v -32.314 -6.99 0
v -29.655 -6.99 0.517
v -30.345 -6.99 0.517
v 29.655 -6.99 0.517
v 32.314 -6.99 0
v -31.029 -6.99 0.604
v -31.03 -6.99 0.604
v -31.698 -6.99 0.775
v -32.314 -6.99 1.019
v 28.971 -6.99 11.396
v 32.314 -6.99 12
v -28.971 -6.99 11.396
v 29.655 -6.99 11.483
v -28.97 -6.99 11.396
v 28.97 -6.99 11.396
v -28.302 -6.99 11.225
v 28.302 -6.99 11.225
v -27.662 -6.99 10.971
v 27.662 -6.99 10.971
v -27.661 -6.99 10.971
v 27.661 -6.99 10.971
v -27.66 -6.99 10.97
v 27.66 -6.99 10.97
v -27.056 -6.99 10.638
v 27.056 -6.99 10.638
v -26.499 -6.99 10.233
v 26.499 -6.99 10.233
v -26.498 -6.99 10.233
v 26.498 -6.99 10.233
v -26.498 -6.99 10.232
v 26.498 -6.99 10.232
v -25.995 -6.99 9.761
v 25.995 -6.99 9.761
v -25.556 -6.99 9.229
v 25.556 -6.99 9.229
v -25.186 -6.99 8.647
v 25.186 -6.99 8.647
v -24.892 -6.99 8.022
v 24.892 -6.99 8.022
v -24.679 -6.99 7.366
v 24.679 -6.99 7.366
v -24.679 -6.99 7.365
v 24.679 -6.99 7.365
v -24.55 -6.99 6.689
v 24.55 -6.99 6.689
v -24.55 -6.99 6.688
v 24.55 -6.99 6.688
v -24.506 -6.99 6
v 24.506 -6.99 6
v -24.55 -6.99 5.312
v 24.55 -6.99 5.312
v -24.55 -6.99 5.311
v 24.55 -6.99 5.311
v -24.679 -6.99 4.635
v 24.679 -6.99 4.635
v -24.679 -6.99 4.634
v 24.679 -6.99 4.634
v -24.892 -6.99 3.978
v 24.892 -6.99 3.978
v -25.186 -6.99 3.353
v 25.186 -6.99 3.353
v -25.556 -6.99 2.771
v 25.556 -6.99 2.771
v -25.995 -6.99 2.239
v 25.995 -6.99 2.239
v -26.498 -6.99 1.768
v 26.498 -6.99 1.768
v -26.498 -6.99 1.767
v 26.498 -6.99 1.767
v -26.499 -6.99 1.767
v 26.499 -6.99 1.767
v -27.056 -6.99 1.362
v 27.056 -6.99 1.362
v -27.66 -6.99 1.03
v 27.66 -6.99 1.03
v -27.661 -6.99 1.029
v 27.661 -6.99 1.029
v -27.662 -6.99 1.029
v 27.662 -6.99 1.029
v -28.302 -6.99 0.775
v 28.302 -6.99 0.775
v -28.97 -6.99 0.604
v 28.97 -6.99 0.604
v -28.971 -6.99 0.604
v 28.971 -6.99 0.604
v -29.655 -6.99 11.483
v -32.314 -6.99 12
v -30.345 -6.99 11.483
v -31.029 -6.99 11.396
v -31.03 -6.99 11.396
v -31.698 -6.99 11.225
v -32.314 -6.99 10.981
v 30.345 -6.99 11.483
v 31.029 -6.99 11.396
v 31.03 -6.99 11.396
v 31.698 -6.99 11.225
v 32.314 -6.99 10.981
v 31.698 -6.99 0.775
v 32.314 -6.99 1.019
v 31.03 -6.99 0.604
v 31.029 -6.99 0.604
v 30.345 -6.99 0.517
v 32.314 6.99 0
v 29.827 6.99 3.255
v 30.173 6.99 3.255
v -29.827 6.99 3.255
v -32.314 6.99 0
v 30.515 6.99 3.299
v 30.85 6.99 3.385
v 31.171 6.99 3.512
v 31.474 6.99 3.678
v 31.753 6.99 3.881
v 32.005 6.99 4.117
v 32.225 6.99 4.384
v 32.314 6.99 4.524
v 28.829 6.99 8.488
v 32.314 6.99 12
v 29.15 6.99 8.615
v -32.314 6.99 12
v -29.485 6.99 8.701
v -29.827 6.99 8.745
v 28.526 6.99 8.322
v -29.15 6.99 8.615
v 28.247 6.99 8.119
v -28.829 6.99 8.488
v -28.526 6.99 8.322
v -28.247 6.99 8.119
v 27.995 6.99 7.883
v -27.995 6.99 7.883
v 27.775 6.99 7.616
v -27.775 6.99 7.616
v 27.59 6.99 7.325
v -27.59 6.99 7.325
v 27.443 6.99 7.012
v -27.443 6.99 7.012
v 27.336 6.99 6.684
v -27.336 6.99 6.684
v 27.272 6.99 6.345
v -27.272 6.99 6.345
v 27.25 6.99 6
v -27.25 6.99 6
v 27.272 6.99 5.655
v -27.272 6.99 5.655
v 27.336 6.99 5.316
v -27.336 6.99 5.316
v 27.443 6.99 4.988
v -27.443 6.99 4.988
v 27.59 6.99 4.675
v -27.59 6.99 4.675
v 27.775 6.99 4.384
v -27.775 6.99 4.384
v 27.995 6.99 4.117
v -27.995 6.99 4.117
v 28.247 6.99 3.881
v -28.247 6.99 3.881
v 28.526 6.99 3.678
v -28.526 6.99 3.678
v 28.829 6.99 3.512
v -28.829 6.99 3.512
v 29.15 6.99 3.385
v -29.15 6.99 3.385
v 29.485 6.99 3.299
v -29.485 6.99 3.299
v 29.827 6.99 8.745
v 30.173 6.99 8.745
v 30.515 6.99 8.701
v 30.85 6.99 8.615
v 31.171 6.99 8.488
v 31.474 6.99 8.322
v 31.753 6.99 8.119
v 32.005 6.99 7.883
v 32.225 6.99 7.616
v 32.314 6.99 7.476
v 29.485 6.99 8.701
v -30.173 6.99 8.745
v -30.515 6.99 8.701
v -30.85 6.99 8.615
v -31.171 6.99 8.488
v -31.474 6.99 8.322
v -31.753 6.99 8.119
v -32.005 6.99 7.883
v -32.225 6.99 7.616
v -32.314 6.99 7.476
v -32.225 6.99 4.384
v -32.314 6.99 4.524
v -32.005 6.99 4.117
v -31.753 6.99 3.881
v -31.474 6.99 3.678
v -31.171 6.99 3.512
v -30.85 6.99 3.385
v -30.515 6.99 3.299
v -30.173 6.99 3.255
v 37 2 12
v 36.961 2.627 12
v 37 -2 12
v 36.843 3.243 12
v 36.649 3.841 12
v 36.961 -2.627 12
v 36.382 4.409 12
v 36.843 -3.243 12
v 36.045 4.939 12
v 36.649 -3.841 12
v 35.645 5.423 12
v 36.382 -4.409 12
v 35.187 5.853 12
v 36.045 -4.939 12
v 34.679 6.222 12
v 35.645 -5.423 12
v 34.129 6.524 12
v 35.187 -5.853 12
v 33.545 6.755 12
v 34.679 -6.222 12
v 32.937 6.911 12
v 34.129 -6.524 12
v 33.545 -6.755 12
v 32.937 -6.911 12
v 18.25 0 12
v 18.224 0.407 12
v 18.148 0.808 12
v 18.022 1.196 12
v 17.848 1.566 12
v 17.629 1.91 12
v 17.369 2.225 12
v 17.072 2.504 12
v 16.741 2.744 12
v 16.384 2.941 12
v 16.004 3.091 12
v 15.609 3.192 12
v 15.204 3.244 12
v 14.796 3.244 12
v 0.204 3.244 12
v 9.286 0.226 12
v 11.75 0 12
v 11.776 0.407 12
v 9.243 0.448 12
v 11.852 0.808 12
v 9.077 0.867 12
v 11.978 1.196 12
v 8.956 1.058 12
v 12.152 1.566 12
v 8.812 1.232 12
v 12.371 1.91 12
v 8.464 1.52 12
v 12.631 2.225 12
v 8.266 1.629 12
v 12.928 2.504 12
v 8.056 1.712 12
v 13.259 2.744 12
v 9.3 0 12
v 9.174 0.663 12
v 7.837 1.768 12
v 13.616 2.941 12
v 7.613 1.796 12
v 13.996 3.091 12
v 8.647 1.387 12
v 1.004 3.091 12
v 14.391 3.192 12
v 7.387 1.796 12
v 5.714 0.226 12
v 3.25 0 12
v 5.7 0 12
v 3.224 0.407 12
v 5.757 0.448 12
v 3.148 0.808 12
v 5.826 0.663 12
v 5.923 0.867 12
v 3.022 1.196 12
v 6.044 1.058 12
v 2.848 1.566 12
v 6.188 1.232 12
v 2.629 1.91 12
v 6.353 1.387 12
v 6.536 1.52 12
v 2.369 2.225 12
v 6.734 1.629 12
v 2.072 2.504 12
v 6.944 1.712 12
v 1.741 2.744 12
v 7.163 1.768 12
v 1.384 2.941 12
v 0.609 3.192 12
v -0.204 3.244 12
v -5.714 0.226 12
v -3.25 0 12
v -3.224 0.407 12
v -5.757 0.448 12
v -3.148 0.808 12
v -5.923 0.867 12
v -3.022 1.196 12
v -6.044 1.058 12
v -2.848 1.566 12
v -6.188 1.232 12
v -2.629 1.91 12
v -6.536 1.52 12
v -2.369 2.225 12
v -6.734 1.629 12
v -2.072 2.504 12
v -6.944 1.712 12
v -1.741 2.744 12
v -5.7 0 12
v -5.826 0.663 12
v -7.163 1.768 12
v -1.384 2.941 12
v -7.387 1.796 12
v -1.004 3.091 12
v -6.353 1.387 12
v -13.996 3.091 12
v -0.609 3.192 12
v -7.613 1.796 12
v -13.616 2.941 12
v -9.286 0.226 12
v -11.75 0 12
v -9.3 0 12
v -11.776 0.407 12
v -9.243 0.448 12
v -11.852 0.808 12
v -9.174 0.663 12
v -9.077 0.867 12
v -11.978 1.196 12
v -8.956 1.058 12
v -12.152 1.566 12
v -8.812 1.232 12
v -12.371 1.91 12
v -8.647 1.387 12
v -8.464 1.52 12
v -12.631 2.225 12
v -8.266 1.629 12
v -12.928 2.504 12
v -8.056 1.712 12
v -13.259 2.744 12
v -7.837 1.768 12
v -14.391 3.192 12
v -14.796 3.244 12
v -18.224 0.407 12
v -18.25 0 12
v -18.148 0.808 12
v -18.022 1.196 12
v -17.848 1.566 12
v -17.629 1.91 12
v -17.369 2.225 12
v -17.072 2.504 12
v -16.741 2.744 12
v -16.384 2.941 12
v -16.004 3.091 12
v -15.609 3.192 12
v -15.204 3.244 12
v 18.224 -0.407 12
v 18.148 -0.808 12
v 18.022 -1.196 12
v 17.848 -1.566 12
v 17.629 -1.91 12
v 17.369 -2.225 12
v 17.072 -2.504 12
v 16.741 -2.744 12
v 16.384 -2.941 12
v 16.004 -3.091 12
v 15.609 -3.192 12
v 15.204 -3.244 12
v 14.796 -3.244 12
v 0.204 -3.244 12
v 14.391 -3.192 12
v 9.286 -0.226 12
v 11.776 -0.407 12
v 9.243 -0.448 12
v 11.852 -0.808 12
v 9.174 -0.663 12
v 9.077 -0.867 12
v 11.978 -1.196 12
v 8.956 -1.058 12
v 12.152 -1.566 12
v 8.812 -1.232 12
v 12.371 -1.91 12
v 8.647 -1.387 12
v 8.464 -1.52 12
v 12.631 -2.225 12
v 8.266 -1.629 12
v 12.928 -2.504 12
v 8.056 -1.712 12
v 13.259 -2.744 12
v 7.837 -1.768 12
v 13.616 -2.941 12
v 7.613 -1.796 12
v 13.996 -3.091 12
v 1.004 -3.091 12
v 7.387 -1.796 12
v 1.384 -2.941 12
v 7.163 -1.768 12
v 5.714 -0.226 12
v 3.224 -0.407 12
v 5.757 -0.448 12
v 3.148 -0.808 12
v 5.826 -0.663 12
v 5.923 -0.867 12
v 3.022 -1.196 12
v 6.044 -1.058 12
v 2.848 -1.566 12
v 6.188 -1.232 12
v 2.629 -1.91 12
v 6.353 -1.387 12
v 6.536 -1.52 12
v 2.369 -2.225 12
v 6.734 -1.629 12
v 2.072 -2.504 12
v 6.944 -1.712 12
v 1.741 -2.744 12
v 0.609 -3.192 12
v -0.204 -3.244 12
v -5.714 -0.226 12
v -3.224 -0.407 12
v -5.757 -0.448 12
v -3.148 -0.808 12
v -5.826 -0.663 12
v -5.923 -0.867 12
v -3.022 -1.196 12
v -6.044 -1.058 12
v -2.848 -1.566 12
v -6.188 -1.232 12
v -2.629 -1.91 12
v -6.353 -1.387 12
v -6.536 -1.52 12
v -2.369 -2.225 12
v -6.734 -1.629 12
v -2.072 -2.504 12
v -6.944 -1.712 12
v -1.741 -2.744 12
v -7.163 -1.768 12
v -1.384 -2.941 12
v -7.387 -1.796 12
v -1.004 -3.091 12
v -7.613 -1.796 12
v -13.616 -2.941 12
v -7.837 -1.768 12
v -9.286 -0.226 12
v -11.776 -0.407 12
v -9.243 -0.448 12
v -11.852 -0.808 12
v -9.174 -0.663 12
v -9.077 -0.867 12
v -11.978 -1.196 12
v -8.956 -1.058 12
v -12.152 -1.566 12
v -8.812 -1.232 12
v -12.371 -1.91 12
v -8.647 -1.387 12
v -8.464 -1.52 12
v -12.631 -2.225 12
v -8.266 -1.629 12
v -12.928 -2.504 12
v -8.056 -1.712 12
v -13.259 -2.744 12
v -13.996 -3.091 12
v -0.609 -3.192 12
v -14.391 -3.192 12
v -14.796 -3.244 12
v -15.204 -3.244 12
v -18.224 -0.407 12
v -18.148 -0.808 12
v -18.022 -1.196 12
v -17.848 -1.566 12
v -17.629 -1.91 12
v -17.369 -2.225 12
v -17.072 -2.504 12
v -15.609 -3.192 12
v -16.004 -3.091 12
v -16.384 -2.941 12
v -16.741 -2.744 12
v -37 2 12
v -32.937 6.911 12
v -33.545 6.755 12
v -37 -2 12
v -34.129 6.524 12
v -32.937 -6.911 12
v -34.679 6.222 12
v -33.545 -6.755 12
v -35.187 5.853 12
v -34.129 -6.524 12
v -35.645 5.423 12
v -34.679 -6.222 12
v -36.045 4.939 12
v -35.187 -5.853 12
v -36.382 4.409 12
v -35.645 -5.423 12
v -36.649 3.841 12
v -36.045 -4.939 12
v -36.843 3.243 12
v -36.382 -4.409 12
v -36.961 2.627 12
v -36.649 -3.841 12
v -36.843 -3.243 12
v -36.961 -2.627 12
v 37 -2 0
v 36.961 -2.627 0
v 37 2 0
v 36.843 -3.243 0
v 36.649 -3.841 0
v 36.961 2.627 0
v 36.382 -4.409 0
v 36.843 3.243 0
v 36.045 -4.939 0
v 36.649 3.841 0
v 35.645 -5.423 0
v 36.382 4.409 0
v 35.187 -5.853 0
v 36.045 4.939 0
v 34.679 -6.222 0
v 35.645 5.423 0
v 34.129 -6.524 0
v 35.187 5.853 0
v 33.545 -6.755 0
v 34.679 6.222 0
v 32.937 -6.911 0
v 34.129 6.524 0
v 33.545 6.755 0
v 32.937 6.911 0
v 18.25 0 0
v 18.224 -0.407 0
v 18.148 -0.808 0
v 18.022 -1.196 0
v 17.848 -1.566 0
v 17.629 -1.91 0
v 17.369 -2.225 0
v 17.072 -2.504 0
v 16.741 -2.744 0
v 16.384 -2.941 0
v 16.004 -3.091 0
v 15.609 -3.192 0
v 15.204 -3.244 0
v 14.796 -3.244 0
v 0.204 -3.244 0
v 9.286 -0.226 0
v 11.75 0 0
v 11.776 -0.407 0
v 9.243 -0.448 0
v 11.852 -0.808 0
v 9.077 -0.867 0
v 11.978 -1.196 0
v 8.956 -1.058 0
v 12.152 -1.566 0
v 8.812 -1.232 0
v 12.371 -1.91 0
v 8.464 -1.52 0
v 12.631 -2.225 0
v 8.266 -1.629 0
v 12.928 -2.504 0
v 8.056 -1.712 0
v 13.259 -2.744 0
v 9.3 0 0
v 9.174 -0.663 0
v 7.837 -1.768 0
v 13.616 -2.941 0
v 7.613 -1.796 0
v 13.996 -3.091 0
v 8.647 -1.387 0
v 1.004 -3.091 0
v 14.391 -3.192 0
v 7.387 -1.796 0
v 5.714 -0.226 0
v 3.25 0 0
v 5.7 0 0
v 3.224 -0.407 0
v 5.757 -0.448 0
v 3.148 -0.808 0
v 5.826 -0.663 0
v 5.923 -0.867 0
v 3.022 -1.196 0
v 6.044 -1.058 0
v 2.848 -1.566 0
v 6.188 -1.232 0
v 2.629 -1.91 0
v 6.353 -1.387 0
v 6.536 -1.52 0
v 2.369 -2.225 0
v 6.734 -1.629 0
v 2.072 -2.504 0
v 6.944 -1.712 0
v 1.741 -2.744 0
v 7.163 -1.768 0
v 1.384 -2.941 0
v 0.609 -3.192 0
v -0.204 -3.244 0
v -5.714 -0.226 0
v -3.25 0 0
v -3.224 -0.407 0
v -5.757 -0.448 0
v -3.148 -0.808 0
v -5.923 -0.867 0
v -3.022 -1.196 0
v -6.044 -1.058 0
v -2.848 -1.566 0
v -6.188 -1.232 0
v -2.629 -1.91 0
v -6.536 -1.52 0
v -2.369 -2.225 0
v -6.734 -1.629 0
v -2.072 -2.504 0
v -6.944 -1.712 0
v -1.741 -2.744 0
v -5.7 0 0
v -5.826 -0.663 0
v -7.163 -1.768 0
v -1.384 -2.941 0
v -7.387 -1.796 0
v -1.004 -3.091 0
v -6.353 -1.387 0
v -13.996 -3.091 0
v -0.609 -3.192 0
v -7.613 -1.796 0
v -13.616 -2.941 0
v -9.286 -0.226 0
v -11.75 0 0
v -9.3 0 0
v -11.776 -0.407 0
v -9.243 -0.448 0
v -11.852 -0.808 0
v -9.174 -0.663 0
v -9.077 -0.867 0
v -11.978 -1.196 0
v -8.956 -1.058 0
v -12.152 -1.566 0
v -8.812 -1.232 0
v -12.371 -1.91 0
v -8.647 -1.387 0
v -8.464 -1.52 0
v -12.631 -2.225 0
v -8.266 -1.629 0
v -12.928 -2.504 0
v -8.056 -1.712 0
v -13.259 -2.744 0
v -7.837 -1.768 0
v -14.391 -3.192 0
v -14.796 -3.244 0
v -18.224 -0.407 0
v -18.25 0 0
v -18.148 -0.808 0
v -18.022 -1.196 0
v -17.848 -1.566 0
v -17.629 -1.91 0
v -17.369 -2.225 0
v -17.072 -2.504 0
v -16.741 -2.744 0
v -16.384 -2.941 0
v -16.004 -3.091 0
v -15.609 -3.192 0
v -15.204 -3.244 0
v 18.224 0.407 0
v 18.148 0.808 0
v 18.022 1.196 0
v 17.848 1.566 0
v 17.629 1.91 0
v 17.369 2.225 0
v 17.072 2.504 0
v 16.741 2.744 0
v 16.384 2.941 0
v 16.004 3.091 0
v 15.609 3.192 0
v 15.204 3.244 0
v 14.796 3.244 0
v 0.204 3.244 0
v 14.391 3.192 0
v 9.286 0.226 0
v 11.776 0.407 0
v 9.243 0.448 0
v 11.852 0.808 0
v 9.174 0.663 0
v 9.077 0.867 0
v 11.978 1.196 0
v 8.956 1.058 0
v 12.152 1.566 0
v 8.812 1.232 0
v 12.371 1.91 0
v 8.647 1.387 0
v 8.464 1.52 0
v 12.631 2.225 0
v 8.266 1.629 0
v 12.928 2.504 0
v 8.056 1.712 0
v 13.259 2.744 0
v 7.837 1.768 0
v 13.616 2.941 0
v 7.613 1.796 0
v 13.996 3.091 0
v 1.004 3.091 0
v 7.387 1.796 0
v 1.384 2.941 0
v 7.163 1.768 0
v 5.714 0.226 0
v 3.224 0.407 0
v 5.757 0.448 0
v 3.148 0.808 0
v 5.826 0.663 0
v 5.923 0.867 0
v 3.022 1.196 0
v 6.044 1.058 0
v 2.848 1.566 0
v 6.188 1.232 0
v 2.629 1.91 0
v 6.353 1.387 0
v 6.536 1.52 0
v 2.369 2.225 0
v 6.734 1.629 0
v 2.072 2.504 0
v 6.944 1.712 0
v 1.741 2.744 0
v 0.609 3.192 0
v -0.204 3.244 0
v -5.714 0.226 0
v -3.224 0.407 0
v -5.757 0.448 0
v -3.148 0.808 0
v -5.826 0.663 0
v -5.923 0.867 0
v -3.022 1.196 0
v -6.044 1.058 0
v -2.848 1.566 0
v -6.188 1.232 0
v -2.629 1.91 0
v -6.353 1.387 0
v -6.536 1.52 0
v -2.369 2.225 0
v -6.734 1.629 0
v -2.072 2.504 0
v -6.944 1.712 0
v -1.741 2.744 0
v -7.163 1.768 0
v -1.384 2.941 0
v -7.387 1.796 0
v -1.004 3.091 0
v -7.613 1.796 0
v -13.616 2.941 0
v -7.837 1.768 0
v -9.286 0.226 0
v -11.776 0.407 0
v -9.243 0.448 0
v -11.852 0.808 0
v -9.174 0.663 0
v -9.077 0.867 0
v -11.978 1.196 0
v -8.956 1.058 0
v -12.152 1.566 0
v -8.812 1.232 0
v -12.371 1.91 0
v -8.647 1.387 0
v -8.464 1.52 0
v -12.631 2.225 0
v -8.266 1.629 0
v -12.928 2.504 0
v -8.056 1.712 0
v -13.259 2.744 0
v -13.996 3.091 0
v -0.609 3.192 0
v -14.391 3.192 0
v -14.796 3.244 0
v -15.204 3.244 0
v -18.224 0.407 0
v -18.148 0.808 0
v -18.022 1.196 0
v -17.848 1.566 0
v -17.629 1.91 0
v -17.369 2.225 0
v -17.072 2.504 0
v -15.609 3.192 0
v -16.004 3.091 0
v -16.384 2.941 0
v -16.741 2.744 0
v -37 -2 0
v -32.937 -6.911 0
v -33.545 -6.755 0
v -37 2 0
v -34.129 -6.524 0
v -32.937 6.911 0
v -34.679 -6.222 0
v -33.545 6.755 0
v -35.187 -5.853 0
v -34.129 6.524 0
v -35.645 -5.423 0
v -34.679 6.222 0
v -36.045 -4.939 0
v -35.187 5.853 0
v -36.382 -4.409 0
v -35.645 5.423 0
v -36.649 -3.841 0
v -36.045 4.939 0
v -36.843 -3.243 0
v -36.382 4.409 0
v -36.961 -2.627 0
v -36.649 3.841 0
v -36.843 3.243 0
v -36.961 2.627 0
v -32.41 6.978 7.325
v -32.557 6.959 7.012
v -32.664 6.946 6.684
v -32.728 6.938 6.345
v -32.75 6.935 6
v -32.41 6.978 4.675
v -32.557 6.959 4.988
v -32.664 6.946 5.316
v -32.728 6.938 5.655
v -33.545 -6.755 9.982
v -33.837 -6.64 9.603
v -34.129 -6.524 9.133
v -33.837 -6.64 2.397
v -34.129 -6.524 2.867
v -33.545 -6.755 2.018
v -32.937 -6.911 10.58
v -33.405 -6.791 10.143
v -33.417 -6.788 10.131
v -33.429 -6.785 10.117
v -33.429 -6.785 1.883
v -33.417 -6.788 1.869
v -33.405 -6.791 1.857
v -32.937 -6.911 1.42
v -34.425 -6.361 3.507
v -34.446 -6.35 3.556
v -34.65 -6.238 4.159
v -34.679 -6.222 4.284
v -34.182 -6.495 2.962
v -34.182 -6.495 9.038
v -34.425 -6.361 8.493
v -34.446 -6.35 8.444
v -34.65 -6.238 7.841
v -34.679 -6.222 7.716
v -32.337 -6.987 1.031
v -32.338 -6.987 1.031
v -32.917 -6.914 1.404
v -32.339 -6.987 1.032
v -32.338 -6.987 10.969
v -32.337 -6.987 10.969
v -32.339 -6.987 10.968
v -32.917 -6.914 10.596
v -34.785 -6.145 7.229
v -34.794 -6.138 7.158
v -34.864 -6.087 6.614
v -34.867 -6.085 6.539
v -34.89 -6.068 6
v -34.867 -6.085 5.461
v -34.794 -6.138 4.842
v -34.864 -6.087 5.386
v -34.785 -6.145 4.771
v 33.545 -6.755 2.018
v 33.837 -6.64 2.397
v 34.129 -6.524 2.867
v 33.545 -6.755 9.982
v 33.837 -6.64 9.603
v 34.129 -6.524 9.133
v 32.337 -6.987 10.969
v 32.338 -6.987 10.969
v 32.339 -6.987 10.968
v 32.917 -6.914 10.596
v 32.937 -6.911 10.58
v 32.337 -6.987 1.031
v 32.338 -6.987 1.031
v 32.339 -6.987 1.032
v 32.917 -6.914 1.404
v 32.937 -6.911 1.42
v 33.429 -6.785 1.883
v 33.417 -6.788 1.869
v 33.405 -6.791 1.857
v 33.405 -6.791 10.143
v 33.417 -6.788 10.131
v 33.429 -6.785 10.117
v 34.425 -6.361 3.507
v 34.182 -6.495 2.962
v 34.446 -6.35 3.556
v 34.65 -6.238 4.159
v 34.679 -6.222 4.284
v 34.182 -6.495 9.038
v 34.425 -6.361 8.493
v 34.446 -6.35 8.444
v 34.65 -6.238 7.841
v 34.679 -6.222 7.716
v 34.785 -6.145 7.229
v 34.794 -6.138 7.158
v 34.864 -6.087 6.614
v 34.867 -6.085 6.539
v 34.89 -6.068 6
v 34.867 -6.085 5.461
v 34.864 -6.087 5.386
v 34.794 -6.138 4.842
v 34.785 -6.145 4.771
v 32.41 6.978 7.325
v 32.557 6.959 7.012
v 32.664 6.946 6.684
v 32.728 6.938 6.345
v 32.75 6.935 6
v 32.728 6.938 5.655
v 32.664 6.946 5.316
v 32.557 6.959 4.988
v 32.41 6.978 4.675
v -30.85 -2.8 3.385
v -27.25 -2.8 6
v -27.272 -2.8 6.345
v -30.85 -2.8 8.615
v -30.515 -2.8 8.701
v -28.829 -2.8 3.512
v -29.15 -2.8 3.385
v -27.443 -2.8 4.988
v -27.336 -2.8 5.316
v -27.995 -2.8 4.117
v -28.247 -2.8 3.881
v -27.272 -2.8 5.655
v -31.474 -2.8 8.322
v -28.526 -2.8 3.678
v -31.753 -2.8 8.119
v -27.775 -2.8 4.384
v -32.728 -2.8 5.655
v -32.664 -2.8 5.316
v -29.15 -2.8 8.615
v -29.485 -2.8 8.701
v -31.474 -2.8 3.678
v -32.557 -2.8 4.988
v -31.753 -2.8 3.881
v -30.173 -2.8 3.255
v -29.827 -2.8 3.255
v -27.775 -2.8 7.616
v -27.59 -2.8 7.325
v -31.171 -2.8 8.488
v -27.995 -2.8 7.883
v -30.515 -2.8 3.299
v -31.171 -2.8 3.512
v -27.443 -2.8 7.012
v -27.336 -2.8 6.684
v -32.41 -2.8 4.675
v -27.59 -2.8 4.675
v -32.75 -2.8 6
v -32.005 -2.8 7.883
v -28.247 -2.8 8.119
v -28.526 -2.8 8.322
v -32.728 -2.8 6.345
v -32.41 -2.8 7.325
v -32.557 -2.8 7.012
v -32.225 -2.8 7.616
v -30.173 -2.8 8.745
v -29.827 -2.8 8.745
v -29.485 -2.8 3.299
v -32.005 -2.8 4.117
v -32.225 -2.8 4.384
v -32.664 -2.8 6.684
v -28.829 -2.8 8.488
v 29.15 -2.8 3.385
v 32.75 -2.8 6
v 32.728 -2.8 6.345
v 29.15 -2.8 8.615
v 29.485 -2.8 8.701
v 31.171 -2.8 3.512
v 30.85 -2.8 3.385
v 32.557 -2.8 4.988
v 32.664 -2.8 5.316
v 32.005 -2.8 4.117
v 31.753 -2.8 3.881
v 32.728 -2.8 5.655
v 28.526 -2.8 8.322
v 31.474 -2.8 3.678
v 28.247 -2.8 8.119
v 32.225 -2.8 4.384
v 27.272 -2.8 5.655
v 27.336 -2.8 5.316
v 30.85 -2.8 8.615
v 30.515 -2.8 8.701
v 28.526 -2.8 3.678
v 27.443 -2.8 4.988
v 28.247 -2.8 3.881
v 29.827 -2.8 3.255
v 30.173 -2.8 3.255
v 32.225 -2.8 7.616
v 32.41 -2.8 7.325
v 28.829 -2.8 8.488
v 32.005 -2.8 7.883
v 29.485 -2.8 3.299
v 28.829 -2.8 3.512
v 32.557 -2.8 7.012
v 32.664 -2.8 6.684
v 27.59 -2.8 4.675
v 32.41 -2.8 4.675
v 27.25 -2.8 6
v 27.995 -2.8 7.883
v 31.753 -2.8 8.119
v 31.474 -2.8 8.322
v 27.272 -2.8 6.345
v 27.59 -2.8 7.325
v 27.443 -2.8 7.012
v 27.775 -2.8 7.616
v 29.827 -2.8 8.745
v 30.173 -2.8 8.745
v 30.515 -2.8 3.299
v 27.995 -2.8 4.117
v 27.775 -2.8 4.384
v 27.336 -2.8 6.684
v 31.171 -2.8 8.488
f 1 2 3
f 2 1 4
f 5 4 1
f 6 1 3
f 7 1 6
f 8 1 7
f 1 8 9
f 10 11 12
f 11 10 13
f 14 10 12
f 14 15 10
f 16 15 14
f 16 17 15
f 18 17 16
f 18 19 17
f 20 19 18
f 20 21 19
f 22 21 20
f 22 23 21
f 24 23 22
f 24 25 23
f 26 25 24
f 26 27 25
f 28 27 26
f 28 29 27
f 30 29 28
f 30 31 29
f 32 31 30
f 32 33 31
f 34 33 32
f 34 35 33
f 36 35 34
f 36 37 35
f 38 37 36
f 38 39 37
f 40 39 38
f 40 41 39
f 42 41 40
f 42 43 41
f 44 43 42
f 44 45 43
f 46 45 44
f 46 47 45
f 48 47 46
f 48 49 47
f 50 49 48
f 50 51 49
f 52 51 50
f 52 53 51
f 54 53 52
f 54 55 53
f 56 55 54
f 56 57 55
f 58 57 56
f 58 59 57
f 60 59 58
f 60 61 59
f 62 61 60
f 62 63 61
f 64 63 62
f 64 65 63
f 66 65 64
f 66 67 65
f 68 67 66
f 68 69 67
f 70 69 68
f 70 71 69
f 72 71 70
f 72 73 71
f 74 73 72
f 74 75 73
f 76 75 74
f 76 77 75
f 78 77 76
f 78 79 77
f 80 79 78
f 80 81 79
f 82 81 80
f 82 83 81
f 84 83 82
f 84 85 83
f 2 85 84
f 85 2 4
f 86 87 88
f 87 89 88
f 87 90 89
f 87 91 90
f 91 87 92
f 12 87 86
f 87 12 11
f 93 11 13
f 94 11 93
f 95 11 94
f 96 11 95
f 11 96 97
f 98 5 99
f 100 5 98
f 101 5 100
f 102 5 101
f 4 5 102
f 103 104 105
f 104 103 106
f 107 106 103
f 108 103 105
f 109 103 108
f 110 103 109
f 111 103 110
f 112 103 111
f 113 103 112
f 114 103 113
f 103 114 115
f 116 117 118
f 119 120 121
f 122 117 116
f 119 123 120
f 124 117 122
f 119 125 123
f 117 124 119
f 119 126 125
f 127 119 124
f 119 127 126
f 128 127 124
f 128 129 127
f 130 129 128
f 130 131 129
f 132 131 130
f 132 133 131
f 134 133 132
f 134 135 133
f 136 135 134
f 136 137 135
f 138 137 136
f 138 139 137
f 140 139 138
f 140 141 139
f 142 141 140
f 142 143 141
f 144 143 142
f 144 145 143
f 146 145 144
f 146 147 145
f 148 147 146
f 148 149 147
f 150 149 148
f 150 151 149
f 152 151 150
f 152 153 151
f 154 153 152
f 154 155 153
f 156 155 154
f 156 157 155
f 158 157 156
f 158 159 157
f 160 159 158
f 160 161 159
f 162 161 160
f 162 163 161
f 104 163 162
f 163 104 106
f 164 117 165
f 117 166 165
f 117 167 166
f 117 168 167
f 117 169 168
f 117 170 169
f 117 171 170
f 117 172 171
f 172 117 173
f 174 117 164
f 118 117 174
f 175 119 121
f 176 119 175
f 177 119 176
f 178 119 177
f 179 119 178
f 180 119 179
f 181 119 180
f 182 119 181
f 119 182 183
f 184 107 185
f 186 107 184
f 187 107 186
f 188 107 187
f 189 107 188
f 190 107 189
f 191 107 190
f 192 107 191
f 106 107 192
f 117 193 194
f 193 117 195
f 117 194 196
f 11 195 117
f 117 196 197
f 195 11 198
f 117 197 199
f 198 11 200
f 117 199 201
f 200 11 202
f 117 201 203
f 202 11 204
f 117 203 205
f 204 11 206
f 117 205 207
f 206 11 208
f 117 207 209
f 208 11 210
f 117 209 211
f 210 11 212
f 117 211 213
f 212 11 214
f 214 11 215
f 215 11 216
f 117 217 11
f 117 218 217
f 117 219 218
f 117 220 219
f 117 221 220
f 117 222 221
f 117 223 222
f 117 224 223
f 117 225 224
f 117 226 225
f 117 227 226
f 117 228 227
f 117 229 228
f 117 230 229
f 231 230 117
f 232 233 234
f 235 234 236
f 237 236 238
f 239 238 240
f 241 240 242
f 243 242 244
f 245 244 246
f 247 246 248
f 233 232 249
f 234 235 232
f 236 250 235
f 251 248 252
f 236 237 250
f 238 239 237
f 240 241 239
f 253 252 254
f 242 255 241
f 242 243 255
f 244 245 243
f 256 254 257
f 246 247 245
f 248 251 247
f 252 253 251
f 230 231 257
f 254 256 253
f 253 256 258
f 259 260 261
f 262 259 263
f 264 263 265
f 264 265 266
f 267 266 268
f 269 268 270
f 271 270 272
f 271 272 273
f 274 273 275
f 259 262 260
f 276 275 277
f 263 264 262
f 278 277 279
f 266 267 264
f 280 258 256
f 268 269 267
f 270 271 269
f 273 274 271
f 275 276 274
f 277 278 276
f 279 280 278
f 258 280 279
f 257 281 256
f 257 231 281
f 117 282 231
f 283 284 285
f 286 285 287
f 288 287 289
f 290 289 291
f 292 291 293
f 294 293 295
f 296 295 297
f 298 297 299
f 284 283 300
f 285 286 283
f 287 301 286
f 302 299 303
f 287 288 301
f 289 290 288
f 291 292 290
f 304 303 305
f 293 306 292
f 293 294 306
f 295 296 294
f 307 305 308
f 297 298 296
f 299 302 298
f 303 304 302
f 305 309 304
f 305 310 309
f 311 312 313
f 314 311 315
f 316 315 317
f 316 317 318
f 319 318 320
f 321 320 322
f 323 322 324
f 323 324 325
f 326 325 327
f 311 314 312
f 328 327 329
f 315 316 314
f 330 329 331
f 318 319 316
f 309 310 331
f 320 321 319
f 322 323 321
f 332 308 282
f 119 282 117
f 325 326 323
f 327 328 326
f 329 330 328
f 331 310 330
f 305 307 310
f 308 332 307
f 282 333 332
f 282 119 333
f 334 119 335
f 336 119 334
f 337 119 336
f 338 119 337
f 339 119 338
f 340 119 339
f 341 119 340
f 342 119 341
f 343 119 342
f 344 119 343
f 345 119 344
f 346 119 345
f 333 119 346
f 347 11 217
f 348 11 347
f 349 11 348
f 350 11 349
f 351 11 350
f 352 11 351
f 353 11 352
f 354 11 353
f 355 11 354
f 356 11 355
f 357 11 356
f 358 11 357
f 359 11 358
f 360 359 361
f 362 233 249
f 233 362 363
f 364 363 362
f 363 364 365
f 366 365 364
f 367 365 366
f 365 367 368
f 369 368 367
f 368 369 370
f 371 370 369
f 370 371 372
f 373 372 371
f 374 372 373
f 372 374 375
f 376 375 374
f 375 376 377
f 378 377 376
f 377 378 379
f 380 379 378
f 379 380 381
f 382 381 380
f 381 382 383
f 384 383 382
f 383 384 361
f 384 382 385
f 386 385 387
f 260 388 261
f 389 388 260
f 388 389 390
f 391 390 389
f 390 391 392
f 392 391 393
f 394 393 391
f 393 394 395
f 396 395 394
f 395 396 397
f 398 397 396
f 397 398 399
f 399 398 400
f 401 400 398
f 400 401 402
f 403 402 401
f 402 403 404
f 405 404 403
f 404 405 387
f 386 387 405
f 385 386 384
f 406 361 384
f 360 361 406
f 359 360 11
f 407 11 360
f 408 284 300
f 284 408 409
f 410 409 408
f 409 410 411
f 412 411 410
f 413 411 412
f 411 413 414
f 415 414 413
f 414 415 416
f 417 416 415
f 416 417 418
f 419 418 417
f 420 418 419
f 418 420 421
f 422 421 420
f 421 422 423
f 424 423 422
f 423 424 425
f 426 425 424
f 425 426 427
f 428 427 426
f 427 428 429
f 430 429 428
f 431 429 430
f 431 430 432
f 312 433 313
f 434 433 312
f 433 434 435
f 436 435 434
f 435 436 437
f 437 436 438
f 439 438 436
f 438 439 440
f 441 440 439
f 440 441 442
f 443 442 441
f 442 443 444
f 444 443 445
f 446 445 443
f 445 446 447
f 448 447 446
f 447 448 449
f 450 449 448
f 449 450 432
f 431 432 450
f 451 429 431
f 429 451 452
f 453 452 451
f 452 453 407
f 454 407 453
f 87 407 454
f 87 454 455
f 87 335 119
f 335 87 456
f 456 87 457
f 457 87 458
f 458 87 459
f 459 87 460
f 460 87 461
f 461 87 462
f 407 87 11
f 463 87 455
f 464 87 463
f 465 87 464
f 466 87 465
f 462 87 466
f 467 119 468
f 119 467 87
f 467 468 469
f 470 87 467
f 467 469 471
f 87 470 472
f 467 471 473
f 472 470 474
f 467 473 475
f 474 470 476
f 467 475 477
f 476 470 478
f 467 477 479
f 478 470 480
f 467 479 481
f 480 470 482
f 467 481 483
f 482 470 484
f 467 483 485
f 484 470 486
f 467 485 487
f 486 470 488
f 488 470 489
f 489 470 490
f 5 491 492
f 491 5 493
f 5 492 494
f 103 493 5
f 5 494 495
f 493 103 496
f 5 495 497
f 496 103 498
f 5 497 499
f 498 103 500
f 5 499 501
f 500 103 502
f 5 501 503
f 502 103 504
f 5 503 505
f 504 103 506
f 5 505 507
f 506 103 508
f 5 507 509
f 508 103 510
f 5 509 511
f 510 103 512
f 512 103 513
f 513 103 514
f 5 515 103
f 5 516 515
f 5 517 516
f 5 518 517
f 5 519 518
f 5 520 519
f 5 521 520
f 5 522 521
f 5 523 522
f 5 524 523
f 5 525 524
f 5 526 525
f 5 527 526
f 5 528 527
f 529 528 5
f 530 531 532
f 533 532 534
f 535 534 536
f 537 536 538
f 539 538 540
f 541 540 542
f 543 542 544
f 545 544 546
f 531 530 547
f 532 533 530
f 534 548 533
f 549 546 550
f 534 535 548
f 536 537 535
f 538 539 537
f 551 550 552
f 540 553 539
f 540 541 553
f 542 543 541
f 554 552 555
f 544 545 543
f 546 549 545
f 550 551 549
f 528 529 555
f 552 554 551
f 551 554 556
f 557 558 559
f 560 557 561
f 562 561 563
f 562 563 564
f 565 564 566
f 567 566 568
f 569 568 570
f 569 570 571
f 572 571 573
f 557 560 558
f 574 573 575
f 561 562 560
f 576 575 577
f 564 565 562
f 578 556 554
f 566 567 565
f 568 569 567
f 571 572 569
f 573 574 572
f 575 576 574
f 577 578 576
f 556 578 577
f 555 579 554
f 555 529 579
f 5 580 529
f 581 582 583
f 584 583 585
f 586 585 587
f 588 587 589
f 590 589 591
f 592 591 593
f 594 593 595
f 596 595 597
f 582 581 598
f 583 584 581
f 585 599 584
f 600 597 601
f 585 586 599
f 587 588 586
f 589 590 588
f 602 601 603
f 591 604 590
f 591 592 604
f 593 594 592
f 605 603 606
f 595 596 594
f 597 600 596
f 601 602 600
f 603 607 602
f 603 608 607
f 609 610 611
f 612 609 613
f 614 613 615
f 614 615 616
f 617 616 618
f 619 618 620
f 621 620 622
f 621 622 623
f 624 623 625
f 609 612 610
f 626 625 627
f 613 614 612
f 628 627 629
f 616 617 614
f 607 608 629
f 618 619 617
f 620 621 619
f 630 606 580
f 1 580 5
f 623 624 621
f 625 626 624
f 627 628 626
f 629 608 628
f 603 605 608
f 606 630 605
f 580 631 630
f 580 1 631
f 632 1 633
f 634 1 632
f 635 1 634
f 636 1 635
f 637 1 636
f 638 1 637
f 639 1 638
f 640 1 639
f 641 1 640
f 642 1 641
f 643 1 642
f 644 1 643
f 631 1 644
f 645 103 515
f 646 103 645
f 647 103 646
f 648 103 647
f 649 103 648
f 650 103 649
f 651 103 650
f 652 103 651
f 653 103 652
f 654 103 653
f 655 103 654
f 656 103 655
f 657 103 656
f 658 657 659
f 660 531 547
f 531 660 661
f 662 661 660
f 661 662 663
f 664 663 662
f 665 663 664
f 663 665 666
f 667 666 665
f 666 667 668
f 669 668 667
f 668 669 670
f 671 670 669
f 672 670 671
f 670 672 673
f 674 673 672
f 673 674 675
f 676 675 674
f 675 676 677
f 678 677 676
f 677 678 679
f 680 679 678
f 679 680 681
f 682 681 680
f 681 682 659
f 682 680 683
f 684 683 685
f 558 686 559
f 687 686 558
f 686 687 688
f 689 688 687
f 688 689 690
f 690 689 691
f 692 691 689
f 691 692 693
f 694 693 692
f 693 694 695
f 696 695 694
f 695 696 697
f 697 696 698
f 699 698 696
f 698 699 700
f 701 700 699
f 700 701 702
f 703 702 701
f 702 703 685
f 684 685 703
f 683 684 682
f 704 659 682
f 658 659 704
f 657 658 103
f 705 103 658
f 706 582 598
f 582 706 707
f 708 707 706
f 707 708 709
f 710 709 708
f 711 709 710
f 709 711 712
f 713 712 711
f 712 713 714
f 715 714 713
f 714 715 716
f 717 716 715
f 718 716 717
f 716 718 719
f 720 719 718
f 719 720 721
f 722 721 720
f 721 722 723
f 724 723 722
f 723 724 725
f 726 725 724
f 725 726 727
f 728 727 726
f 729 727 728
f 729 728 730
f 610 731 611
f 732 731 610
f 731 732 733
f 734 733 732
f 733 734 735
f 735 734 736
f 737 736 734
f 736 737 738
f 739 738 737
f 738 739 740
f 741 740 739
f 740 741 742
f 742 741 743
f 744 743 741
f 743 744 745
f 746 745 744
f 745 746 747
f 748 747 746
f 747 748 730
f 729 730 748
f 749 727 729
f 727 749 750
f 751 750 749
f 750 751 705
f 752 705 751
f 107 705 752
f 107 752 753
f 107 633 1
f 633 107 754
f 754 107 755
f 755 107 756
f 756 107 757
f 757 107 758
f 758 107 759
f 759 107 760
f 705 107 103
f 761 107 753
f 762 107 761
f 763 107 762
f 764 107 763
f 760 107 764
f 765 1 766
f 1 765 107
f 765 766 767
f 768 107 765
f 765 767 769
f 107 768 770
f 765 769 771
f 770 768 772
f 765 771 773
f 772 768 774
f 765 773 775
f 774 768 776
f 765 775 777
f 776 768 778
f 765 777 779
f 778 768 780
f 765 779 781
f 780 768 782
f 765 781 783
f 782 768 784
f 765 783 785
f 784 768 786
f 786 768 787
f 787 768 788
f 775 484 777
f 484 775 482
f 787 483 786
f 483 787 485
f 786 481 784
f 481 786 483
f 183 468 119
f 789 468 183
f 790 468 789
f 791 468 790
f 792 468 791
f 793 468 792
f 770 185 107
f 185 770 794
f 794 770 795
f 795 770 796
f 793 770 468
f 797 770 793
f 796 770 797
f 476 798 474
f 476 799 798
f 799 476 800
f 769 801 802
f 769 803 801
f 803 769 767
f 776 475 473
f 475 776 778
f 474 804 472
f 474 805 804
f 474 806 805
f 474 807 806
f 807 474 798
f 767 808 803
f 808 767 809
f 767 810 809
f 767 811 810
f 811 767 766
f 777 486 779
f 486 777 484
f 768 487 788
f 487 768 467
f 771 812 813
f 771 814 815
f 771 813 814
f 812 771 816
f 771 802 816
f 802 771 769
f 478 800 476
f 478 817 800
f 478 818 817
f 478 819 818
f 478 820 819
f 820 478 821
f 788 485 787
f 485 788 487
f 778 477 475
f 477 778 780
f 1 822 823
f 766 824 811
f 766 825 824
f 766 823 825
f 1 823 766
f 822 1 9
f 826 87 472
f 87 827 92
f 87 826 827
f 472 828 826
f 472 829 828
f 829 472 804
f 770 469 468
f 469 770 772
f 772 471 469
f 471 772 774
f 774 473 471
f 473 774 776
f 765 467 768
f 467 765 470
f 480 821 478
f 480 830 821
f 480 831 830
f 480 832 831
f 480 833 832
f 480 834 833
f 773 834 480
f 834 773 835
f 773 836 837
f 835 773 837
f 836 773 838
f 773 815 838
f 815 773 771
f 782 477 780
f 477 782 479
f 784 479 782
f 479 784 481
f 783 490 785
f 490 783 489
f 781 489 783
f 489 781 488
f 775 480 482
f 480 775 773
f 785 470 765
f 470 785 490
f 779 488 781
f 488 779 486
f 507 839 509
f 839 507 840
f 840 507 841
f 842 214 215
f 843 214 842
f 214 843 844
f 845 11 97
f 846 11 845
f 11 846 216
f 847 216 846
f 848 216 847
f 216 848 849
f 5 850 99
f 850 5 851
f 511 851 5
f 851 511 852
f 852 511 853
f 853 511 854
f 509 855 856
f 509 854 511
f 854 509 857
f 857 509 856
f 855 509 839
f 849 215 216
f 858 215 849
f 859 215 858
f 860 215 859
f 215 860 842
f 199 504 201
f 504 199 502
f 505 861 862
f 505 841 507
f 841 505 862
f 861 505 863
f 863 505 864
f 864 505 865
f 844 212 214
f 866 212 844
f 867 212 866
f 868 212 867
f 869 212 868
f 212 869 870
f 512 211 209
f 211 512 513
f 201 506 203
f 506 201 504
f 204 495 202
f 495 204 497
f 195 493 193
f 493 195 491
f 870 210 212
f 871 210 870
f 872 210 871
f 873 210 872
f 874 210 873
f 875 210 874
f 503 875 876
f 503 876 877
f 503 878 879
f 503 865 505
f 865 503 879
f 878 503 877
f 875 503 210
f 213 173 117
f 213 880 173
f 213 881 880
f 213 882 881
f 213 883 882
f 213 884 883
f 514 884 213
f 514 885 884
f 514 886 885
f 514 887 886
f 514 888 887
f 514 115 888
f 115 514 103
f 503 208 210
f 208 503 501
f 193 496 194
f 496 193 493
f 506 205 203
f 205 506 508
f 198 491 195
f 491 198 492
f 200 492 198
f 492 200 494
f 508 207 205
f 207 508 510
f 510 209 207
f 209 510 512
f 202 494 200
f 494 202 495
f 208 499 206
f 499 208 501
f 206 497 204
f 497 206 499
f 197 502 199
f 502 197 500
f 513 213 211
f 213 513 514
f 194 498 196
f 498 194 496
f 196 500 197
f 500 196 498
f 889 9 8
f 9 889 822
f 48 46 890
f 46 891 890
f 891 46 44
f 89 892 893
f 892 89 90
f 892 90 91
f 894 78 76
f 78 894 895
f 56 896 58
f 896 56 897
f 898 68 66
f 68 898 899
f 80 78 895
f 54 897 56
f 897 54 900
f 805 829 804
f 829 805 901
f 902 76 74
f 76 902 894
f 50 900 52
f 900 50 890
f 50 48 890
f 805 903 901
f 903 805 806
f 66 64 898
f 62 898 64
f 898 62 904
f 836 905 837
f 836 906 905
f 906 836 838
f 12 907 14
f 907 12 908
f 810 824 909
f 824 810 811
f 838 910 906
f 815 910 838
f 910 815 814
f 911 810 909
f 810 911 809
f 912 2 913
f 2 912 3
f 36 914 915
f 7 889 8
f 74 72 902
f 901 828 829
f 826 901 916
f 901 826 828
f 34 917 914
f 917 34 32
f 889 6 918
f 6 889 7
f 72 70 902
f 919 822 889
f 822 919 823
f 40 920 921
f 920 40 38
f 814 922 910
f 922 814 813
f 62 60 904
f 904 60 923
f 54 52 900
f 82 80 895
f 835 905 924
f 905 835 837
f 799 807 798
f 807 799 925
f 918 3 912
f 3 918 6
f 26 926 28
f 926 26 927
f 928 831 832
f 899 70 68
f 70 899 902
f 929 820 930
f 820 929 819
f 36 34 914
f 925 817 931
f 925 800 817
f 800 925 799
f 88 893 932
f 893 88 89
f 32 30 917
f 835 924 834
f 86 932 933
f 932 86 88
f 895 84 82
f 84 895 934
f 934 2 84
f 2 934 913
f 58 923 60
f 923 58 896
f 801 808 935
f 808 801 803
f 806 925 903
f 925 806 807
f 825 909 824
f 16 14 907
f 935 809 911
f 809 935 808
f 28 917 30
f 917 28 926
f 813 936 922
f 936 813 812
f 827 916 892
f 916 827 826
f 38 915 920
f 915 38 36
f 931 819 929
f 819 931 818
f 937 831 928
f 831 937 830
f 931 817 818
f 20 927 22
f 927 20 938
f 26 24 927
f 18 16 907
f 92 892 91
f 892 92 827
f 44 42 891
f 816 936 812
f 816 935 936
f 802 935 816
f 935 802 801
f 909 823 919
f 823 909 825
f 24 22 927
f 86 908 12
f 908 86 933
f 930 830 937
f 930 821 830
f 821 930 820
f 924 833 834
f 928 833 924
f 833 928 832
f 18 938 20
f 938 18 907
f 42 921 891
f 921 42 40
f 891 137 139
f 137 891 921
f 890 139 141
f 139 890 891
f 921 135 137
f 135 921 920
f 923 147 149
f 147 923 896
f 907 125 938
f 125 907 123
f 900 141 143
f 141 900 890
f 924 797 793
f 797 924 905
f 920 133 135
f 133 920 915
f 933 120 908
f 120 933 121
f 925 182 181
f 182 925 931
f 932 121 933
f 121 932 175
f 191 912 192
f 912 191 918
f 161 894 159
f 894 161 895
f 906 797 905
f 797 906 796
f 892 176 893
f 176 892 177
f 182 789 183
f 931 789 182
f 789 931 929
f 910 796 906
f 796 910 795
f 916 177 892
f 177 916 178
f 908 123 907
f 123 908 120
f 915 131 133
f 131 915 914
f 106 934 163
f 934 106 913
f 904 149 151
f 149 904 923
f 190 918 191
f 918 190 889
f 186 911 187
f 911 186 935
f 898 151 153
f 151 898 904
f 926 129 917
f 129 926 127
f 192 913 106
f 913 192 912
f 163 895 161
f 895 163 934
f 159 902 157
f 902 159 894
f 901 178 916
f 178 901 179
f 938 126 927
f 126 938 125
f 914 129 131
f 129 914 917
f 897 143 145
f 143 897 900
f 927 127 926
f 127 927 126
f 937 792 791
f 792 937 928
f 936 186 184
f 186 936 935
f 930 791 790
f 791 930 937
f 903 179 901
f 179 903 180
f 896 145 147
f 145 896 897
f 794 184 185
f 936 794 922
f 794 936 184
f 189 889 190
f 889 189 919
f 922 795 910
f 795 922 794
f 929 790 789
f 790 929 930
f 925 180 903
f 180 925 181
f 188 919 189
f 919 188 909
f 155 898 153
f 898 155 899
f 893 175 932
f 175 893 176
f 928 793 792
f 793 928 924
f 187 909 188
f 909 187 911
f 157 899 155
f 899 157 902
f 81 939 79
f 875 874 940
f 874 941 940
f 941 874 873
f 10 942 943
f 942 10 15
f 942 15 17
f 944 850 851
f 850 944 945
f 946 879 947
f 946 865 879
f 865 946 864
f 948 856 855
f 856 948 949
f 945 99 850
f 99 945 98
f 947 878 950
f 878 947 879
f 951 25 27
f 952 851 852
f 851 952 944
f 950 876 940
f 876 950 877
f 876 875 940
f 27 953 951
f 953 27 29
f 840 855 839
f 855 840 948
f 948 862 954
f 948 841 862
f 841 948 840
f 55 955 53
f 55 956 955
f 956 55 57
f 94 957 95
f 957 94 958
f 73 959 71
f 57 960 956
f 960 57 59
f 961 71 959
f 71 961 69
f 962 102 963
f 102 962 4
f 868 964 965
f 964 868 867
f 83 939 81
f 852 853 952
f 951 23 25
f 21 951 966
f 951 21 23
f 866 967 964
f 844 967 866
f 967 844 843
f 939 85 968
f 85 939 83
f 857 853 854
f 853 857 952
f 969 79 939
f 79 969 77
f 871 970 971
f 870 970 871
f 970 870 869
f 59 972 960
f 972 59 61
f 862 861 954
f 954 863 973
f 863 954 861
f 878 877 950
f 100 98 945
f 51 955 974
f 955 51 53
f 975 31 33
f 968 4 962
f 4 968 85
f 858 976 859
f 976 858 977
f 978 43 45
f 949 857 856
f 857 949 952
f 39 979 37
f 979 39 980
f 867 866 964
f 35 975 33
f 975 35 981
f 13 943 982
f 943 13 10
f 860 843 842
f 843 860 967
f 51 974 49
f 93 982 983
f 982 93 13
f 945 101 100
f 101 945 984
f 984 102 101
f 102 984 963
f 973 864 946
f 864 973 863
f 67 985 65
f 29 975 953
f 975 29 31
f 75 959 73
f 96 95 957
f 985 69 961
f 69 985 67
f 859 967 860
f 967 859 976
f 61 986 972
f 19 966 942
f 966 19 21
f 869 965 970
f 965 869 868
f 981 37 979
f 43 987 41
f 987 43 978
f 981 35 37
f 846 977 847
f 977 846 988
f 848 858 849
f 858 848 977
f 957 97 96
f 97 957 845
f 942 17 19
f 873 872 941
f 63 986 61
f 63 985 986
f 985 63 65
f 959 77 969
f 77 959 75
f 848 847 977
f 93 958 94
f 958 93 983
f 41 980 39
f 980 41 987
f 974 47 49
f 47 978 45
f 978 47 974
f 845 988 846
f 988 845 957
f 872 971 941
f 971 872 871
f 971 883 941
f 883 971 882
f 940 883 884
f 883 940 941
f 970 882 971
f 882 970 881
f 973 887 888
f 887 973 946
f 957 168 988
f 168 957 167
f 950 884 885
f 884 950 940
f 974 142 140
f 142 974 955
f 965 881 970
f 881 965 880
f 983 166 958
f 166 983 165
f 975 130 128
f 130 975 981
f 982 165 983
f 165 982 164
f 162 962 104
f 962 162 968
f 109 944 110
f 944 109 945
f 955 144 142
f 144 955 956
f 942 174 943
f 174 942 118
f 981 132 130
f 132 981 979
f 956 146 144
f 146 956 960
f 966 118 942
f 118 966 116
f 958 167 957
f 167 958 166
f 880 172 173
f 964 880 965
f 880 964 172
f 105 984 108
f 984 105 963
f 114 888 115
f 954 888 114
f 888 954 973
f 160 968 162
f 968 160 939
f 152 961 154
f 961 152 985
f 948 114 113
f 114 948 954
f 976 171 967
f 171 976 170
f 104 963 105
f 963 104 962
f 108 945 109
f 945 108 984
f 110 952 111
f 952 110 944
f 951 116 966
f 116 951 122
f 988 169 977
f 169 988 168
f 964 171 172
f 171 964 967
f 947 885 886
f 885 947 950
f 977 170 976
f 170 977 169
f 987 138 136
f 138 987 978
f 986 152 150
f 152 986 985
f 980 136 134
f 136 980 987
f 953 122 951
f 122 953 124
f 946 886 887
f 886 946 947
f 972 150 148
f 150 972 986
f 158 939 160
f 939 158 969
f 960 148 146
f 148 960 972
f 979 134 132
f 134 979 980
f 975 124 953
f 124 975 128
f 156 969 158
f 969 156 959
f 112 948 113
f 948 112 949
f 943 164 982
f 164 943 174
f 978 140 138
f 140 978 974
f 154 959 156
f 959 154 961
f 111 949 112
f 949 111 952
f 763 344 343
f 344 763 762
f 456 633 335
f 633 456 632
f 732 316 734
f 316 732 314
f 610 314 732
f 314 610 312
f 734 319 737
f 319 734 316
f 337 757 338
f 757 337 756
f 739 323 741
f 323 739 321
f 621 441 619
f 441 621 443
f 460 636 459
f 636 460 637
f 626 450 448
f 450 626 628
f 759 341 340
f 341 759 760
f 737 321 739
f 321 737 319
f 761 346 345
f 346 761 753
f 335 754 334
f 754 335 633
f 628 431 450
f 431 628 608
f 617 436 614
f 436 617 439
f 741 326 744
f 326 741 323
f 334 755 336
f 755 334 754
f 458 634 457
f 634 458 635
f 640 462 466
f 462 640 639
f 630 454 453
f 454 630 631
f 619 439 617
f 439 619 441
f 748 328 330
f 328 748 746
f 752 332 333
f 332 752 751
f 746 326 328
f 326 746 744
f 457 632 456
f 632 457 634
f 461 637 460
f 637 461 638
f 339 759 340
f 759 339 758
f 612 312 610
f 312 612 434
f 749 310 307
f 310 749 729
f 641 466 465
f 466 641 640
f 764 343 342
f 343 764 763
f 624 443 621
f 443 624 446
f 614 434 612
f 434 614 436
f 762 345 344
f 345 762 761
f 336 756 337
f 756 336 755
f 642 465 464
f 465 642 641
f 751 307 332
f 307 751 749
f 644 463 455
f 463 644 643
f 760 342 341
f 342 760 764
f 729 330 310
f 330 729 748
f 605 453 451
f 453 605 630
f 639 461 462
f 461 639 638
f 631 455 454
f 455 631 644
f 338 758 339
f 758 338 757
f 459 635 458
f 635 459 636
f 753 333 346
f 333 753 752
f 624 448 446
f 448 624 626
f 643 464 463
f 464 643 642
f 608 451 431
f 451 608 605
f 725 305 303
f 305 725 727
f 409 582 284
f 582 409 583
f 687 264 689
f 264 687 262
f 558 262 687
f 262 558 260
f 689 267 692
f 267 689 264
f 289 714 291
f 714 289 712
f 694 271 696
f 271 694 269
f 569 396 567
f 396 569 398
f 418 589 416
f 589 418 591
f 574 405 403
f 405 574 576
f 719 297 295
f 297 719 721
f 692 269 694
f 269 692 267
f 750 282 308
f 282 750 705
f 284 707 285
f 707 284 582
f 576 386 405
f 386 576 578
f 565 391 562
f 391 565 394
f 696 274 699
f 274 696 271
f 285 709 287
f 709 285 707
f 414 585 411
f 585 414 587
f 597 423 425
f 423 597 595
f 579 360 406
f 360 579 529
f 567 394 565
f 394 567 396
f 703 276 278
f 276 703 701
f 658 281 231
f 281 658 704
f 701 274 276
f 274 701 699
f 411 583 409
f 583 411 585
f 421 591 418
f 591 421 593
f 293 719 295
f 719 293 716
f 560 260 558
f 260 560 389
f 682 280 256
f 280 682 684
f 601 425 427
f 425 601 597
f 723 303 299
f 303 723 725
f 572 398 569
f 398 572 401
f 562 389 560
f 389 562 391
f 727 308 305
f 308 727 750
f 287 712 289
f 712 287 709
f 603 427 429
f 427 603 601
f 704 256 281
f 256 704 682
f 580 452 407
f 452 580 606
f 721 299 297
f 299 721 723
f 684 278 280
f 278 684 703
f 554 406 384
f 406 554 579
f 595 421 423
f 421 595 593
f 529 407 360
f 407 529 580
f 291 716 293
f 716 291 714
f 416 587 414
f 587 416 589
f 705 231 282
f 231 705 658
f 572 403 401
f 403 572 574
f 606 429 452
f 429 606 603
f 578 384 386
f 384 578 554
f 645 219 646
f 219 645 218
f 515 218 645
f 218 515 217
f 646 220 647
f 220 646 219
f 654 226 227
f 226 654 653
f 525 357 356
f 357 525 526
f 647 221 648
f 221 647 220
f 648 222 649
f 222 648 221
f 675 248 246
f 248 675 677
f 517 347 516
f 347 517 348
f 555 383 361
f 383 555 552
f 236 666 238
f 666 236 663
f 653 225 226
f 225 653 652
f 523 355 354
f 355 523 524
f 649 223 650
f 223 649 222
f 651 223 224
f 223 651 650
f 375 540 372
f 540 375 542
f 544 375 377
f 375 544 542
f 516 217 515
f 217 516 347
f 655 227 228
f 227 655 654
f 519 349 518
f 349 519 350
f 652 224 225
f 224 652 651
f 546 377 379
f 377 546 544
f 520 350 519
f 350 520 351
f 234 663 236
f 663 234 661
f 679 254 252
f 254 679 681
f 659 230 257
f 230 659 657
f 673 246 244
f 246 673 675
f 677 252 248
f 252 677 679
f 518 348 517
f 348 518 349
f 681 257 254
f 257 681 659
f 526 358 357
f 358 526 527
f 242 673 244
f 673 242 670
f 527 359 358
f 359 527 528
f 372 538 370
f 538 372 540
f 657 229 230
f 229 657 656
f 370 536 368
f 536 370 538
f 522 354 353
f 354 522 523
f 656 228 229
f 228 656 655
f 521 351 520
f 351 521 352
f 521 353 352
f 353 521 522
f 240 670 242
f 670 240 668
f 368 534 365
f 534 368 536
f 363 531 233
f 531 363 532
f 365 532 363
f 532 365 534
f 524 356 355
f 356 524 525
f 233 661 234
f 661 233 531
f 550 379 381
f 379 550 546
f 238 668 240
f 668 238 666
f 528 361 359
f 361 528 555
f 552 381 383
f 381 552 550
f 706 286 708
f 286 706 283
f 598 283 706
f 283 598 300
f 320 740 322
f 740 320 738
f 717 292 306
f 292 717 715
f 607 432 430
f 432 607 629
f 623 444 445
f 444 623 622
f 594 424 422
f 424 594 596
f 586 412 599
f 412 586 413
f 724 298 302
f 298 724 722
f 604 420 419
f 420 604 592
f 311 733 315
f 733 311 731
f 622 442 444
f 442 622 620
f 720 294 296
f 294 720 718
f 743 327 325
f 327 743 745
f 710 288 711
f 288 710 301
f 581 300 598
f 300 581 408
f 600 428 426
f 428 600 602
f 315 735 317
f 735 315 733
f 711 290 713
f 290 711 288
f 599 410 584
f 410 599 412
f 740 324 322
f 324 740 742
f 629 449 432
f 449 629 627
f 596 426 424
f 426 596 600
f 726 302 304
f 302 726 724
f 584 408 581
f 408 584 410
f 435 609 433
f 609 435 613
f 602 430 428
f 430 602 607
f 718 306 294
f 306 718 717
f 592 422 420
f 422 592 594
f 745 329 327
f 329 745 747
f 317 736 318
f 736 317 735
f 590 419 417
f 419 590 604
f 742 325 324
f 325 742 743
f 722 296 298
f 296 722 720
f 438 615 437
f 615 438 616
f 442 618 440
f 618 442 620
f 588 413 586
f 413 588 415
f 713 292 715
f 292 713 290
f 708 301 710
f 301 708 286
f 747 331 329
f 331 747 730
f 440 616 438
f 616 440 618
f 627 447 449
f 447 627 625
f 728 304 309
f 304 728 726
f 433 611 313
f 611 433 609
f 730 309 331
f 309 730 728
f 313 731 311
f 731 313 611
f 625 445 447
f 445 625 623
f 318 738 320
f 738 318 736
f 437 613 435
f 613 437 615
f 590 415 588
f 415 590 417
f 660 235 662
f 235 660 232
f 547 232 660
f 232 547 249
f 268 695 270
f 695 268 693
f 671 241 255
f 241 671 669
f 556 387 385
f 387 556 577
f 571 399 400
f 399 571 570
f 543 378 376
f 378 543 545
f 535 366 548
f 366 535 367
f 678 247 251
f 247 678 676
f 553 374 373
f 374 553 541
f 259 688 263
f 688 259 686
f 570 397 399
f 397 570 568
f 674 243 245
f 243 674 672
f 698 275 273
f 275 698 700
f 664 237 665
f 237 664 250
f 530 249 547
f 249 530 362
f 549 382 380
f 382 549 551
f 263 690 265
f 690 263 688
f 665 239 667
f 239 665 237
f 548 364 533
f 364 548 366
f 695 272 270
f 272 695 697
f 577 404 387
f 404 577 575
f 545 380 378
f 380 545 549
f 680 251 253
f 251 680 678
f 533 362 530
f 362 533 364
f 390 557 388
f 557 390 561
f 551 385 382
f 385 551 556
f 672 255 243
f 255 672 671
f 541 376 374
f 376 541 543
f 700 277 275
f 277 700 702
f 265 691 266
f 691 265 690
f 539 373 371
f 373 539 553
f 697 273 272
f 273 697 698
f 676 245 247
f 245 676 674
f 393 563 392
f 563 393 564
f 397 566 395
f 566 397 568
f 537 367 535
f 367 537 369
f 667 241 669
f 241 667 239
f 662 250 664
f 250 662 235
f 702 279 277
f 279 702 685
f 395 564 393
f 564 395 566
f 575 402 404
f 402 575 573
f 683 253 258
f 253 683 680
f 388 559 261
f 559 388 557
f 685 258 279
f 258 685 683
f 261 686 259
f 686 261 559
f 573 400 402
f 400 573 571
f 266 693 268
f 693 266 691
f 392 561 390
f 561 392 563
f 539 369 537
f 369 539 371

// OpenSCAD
$fn = 50;


difference() {
	union() {
		hull() {
			translate(v = [-17.0000000000, 2.0000000000, 0]) {
				cylinder(h = 12, r = 5);
			}
			translate(v = [17.0000000000, 2.0000000000, 0]) {
				cylinder(h = 12, r = 5);
			}
			translate(v = [-17.0000000000, -2.0000000000, 0]) {
				cylinder(h = 12, r = 5);
			}
			translate(v = [17.0000000000, -2.0000000000, 0]) {
				cylinder(h = 12, r = 5);
			}
		}
		translate(v = [-22.5000000000, 0.0000000000, 0]) {
			hull() {
				translate(v = [-9.5000000000, 2.0000000000, 0]) {
					cylinder(h = 12, r = 5);
				}
				translate(v = [9.5000000000, 2.0000000000, 0]) {
					cylinder(h = 12, r = 5);
				}
				translate(v = [-9.5000000000, -2.0000000000, 0]) {
					cylinder(h = 12, r = 5);
				}
				translate(v = [9.5000000000, -2.0000000000, 0]) {
					cylinder(h = 12, r = 5);
				}
			}
		}
		translate(v = [22.5000000000, 0.0000000000, 0]) {
			hull() {
				translate(v = [-9.5000000000, 2.0000000000, 0]) {
					cylinder(h = 12, r = 5);
				}
				translate(v = [9.5000000000, 2.0000000000, 0]) {
					cylinder(h = 12, r = 5);
				}
				translate(v = [-9.5000000000, -2.0000000000, 0]) {
					cylinder(h = 12, r = 5);
				}
				translate(v = [9.5000000000, -2.0000000000, 0]) {
					cylinder(h = 12, r = 5);
				}
			}
		}
	}
	union() {
		translate(v = [-30.0000000000, -7.0000000000, 6.0000000000]) {
			rotate(a = [90, 0, 0]) {
				difference() {
					union() {
						#translate(v = [0, 0, -14.0000000000]) {
							cylinder(h = 14, r = 2.2500000000);
						}
						#translate(v = [0, 0, -4.2000000000]) {
							cylinder(h = 4.2000000000, r1 = 2.7500000000, r2 = 5.5000000000);
						}
						#translate(v = [0, 0, -14.0000000000]) {
							cylinder(h = 14, r = 2.7500000000);
						}
						#translate(v = [0, 0, -14.0000000000]) {
							cylinder(h = 14, r = 2.2500000000);
						}
					}
					union();
				}
			}
		}
		translate(v = [30.0000000000, -7.0000000000, 6.0000000000]) {
			rotate(a = [90, 0, 0]) {
				difference() {
					union() {
						#translate(v = [0, 0, -14.0000000000]) {
							cylinder(h = 14, r = 2.2500000000);
						}
						#translate(v = [0, 0, -4.2000000000]) {
							cylinder(h = 4.2000000000, r1 = 2.7500000000, r2 = 5.5000000000);
						}
						#translate(v = [0, 0, -14.0000000000]) {
							cylinder(h = 14, r = 2.7500000000);
						}
						#translate(v = [0, 0, -14.0000000000]) {
							cylinder(h = 14, r = 2.2500000000);
						}
					}
					union();
				}
			}
		}
		translate(v = [-15.0000000000, 0.0000000000, 0]) {
			translate(v = [0, 0, -100]) {
				cylinder(h = 200, r = 3.2500000000);
			}
		}
		translate(v = [0, 0, -100]) {
			cylinder(h = 200, r = 3.2500000000);
		}
		translate(v = [15.0000000000, 0.0000000000, 0]) {
			translate(v = [0, 0, -100]) {
				cylinder(h = 200, r = 3.2500000000);
			}
		}
		translate(v = [-15.0000000000, 0.0000000000, 0]) {
			translate(v = [0, 0, -100]) {
				cylinder(h = 200, r = 1.8000000000);
			}
		}
		translate(v = [-7.5000000000, 0.0000000000, 0]) {
			translate(v = [0, 0, -100]) {
				cylinder(h = 200, r = 1.8000000000);
			}
		}
		translate(v = [0, 0, -100]) {
			cylinder(h = 200, r = 1.8000000000);
		}
		translate(v = [7.5000000000, 0.0000000000, 0]) {
			translate(v = [0, 0, -100]) {
				cylinder(h = 200, r = 1.8000000000);
			}
		}
		translate(v = [15.0000000000, 0.0000000000, 0]) {
			translate(v = [0, 0, -100]) {
				cylinder(h = 200, r = 1.8000000000);
			}
		}
	}
}
